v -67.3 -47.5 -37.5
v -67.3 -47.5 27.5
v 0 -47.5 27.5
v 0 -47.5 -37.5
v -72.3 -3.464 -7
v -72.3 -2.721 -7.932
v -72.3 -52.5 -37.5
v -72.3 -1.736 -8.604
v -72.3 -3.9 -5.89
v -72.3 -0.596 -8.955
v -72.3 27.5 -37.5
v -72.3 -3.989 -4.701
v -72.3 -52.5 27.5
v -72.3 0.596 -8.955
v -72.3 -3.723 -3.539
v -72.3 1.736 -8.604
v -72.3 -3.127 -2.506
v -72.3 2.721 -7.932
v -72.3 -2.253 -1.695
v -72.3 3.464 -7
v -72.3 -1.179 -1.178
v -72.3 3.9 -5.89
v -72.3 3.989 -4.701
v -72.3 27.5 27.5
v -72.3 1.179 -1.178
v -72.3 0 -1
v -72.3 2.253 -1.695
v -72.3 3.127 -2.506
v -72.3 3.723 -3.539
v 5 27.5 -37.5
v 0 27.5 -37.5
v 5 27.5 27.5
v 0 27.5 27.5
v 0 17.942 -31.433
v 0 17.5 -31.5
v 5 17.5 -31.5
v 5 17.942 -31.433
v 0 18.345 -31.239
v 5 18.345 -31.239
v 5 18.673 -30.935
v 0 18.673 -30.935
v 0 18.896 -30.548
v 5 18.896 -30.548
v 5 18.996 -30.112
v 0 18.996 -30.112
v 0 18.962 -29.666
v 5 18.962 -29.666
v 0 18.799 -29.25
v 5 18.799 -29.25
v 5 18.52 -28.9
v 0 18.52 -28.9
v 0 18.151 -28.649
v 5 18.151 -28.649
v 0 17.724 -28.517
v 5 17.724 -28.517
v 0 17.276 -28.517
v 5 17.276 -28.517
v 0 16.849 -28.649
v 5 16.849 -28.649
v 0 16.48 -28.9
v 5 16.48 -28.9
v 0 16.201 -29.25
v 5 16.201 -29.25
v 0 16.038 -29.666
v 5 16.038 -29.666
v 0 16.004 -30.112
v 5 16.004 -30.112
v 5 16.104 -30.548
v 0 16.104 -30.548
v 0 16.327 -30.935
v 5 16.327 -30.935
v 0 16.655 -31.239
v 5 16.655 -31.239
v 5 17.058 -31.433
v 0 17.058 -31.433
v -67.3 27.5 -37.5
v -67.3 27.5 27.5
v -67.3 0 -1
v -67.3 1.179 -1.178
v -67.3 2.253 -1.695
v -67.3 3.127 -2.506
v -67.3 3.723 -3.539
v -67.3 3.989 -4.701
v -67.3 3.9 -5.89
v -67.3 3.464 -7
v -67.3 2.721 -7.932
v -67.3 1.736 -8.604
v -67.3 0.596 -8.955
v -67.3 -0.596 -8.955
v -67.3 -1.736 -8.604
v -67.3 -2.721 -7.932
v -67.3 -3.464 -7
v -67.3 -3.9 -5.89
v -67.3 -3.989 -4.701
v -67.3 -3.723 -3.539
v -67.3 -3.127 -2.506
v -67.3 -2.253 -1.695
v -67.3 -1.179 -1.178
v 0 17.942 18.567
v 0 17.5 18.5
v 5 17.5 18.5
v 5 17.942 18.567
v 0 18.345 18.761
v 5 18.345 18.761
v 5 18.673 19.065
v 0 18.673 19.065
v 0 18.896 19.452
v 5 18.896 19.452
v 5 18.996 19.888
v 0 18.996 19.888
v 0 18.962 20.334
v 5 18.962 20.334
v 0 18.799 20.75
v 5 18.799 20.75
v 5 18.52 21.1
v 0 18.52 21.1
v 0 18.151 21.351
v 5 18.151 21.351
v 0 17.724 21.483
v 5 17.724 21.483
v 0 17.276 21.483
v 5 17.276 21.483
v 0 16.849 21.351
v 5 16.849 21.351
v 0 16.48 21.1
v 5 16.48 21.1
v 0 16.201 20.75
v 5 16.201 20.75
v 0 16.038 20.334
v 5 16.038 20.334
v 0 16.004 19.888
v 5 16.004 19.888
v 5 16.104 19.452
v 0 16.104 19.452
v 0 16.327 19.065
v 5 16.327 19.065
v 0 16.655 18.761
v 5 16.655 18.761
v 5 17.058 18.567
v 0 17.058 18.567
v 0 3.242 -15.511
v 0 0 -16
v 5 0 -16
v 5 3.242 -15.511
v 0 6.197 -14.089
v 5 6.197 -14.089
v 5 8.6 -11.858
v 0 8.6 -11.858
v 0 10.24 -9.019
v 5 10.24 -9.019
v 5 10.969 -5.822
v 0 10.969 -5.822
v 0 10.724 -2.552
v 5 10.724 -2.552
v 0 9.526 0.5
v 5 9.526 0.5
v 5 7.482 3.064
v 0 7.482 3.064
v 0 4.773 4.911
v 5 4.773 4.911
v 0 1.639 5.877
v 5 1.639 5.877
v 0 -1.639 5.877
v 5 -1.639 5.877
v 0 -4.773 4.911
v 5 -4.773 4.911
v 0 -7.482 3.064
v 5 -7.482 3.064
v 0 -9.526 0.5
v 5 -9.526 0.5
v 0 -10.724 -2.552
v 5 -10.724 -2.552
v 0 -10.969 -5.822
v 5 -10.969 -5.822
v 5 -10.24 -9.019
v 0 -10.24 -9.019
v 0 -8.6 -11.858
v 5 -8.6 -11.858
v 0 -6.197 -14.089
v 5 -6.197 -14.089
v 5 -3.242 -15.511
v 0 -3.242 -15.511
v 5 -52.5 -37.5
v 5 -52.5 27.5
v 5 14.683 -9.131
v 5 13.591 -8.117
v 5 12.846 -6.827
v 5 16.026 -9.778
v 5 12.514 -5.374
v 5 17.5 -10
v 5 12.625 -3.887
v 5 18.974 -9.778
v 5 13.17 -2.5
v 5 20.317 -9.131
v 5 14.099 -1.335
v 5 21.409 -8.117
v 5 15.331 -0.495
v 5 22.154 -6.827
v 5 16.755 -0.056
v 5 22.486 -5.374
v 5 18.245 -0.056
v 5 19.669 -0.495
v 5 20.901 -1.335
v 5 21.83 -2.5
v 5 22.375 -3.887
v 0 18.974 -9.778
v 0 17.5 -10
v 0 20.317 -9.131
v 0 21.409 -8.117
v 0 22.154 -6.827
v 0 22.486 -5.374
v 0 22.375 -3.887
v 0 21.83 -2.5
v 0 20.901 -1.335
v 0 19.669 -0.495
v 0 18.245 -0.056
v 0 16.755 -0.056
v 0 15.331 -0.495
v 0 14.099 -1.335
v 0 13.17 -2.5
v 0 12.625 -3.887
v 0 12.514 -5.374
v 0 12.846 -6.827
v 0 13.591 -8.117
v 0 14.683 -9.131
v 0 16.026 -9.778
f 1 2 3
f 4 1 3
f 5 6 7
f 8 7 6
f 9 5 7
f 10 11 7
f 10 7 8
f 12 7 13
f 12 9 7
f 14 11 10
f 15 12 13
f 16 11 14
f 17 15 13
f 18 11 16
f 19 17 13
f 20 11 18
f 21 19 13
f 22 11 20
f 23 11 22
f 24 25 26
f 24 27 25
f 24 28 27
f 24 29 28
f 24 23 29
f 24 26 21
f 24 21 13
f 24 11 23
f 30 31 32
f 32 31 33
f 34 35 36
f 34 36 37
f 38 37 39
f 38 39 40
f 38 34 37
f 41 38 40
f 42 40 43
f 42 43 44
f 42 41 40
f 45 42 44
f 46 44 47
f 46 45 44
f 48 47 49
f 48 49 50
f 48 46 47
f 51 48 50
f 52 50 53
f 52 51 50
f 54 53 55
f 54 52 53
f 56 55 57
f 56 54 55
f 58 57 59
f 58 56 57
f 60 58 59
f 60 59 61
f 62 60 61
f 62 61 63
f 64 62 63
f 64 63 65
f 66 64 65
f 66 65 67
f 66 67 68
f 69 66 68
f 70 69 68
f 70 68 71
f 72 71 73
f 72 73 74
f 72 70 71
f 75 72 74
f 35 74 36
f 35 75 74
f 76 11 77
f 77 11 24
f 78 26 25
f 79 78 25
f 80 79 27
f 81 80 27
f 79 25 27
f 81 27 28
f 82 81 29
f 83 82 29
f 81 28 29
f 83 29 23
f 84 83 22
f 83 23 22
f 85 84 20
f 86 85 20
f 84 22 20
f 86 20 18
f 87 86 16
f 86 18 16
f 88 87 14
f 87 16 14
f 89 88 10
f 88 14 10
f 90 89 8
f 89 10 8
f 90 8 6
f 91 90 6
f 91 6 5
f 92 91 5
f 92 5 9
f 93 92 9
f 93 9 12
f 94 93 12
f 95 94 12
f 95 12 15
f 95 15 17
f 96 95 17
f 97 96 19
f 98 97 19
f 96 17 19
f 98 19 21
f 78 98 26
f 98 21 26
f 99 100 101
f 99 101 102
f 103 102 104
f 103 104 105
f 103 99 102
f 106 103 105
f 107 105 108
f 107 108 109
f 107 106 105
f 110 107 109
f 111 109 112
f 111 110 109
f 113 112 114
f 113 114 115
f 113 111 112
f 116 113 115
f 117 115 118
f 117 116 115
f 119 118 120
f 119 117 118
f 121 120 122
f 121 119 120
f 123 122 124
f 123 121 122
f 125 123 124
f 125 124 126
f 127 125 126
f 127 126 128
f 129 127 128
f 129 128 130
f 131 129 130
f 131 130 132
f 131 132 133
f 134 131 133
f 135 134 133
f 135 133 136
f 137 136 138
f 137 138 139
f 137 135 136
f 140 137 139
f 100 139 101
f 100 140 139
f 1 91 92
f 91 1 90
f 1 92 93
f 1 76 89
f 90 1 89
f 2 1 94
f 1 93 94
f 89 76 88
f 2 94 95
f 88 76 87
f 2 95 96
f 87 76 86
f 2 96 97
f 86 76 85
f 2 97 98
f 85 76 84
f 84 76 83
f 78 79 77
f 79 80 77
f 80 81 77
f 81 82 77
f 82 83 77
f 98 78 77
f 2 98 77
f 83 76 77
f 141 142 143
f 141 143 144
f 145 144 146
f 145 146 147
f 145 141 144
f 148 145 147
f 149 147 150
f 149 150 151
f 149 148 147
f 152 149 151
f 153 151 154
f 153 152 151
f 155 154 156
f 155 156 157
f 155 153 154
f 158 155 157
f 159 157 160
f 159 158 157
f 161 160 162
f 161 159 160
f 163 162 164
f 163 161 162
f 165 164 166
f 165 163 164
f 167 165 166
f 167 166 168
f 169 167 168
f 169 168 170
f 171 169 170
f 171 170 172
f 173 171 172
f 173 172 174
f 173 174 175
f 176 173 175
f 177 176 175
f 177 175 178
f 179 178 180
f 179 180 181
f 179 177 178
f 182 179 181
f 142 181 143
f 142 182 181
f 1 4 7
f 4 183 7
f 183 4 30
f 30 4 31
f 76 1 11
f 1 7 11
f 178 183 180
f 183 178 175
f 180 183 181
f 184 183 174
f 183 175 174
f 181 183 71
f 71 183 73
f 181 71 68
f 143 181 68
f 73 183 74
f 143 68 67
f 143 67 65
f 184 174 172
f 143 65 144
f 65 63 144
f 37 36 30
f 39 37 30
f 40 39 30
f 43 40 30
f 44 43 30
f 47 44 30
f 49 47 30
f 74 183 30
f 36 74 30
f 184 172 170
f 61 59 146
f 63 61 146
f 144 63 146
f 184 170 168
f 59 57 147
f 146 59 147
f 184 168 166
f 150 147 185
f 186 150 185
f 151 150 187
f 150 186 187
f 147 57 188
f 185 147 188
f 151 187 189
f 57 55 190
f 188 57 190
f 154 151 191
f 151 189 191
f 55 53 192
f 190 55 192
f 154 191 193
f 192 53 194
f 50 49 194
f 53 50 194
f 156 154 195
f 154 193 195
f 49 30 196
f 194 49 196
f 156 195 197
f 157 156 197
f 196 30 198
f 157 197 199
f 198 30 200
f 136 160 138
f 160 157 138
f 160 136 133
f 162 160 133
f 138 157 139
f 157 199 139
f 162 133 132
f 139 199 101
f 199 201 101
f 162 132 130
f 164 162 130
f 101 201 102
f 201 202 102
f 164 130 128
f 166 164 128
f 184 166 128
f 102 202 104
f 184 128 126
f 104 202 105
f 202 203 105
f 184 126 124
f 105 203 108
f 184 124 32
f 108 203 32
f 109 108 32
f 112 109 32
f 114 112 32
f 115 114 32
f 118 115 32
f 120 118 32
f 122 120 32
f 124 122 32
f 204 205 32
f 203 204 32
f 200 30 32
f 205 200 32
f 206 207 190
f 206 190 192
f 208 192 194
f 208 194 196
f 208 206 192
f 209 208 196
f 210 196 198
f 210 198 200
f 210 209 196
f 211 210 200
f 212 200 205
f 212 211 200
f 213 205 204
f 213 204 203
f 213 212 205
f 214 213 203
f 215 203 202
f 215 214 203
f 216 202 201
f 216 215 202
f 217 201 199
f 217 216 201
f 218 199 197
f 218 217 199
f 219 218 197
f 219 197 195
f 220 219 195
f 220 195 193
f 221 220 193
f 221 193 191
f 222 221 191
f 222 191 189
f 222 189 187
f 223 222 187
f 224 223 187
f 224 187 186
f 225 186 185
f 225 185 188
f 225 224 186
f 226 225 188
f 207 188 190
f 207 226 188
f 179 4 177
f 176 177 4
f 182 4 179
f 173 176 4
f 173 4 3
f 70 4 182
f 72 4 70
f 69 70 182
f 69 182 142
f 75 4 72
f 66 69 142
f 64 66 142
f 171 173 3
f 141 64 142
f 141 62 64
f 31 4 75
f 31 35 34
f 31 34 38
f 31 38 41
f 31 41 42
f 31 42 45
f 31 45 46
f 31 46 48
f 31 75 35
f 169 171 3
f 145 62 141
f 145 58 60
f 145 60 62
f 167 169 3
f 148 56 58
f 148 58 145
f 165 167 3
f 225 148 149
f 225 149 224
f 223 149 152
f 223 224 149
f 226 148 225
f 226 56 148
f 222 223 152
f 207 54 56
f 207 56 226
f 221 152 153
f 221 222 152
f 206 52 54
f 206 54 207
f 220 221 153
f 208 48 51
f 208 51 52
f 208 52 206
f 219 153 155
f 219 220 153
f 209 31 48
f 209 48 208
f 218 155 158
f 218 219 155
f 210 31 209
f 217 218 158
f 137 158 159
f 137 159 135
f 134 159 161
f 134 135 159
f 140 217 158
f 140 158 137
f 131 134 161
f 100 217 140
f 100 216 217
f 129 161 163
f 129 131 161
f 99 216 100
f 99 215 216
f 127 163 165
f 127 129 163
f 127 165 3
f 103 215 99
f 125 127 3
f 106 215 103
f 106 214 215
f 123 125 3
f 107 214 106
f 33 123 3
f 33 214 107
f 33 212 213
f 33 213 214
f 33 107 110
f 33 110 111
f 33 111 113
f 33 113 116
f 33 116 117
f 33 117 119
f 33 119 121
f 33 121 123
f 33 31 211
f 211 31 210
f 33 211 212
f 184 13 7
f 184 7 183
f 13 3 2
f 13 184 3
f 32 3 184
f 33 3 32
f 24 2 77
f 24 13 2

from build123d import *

# Parameters (mm, degrees)
SKETCH1_R           = 11
SKETCH1_R_2         = 5
SKETCH1_R_3         = 1.5
BOSS_EXTRUDE1_DEPTH = 5
SKETCH2_W           = 5
SKETCH2_H           = 65
BOSS_EXTRUDE2_DEPTH = 25
SKETCH3_W           = 72.3
SKETCH3_H           = 65
BOSS_EXTRUDE3_DEPTH = 5
SKETCH4_W           = 65
SKETCH4_H           = 75
SKETCH4_R           = 4
BOSS_EXTRUDE4_DEPTH = 5


with BuildPart() as part:
    # Sketch1 → Boss-Extrude1 (new body)
    with BuildSketch(Plane(origin=(0, 0, 0), x_dir=(0, 0, -1), z_dir=(1, 0, 0))):
        Polygon((-17.5, 27.5), (-27.5, 27.5), (-27.5, 17.5), (-27.5, -27.5), (37.5, -27.5), (37.5, 7.5), (37.5, 27.5), (17.5, 27.5), align=None)
        with Locations((5, 0)):
            Circle(SKETCH1_R, mode=Mode.SUBTRACT)
        with Locations((5, 17.5)):
            Circle(SKETCH1_R_2, mode=Mode.SUBTRACT)
        with Locations((30, 17.5)):
            Circle(SKETCH1_R_3, mode=Mode.SUBTRACT)
        with Locations((-20, 17.5)):
            Circle(SKETCH1_R_3, mode=Mode.SUBTRACT)
    extrude(amount=BOSS_EXTRUDE1_DEPTH)

    # Sketch2 → Boss-Extrude2 (add)
    with BuildSketch(Plane.XZ.offset(27.5)):
        with Locations((2.5, -5)):
            Rectangle(SKETCH2_W, SKETCH2_H)
    extrude(amount=BOSS_EXTRUDE2_DEPTH)

    # Sketch3 → Boss-Extrude3 (add)
    with BuildSketch(Plane.XZ.offset(52.5)):
        with Locations((-36.15, -5)):
            Rectangle(SKETCH3_W, SKETCH3_H)
    extrude(amount=-BOSS_EXTRUDE3_DEPTH)

    # Sketch4 → Boss-Extrude4 (add)
    with BuildSketch(Plane.ZY.offset(72.3)):
        with Locations((-5, -10)):
            Rectangle(SKETCH4_W, SKETCH4_H)
        with Locations((-5, 0)):
            Circle(SKETCH4_R, mode=Mode.SUBTRACT)
    extrude(amount=-BOSS_EXTRUDE4_DEPTH)


solid = part.part
